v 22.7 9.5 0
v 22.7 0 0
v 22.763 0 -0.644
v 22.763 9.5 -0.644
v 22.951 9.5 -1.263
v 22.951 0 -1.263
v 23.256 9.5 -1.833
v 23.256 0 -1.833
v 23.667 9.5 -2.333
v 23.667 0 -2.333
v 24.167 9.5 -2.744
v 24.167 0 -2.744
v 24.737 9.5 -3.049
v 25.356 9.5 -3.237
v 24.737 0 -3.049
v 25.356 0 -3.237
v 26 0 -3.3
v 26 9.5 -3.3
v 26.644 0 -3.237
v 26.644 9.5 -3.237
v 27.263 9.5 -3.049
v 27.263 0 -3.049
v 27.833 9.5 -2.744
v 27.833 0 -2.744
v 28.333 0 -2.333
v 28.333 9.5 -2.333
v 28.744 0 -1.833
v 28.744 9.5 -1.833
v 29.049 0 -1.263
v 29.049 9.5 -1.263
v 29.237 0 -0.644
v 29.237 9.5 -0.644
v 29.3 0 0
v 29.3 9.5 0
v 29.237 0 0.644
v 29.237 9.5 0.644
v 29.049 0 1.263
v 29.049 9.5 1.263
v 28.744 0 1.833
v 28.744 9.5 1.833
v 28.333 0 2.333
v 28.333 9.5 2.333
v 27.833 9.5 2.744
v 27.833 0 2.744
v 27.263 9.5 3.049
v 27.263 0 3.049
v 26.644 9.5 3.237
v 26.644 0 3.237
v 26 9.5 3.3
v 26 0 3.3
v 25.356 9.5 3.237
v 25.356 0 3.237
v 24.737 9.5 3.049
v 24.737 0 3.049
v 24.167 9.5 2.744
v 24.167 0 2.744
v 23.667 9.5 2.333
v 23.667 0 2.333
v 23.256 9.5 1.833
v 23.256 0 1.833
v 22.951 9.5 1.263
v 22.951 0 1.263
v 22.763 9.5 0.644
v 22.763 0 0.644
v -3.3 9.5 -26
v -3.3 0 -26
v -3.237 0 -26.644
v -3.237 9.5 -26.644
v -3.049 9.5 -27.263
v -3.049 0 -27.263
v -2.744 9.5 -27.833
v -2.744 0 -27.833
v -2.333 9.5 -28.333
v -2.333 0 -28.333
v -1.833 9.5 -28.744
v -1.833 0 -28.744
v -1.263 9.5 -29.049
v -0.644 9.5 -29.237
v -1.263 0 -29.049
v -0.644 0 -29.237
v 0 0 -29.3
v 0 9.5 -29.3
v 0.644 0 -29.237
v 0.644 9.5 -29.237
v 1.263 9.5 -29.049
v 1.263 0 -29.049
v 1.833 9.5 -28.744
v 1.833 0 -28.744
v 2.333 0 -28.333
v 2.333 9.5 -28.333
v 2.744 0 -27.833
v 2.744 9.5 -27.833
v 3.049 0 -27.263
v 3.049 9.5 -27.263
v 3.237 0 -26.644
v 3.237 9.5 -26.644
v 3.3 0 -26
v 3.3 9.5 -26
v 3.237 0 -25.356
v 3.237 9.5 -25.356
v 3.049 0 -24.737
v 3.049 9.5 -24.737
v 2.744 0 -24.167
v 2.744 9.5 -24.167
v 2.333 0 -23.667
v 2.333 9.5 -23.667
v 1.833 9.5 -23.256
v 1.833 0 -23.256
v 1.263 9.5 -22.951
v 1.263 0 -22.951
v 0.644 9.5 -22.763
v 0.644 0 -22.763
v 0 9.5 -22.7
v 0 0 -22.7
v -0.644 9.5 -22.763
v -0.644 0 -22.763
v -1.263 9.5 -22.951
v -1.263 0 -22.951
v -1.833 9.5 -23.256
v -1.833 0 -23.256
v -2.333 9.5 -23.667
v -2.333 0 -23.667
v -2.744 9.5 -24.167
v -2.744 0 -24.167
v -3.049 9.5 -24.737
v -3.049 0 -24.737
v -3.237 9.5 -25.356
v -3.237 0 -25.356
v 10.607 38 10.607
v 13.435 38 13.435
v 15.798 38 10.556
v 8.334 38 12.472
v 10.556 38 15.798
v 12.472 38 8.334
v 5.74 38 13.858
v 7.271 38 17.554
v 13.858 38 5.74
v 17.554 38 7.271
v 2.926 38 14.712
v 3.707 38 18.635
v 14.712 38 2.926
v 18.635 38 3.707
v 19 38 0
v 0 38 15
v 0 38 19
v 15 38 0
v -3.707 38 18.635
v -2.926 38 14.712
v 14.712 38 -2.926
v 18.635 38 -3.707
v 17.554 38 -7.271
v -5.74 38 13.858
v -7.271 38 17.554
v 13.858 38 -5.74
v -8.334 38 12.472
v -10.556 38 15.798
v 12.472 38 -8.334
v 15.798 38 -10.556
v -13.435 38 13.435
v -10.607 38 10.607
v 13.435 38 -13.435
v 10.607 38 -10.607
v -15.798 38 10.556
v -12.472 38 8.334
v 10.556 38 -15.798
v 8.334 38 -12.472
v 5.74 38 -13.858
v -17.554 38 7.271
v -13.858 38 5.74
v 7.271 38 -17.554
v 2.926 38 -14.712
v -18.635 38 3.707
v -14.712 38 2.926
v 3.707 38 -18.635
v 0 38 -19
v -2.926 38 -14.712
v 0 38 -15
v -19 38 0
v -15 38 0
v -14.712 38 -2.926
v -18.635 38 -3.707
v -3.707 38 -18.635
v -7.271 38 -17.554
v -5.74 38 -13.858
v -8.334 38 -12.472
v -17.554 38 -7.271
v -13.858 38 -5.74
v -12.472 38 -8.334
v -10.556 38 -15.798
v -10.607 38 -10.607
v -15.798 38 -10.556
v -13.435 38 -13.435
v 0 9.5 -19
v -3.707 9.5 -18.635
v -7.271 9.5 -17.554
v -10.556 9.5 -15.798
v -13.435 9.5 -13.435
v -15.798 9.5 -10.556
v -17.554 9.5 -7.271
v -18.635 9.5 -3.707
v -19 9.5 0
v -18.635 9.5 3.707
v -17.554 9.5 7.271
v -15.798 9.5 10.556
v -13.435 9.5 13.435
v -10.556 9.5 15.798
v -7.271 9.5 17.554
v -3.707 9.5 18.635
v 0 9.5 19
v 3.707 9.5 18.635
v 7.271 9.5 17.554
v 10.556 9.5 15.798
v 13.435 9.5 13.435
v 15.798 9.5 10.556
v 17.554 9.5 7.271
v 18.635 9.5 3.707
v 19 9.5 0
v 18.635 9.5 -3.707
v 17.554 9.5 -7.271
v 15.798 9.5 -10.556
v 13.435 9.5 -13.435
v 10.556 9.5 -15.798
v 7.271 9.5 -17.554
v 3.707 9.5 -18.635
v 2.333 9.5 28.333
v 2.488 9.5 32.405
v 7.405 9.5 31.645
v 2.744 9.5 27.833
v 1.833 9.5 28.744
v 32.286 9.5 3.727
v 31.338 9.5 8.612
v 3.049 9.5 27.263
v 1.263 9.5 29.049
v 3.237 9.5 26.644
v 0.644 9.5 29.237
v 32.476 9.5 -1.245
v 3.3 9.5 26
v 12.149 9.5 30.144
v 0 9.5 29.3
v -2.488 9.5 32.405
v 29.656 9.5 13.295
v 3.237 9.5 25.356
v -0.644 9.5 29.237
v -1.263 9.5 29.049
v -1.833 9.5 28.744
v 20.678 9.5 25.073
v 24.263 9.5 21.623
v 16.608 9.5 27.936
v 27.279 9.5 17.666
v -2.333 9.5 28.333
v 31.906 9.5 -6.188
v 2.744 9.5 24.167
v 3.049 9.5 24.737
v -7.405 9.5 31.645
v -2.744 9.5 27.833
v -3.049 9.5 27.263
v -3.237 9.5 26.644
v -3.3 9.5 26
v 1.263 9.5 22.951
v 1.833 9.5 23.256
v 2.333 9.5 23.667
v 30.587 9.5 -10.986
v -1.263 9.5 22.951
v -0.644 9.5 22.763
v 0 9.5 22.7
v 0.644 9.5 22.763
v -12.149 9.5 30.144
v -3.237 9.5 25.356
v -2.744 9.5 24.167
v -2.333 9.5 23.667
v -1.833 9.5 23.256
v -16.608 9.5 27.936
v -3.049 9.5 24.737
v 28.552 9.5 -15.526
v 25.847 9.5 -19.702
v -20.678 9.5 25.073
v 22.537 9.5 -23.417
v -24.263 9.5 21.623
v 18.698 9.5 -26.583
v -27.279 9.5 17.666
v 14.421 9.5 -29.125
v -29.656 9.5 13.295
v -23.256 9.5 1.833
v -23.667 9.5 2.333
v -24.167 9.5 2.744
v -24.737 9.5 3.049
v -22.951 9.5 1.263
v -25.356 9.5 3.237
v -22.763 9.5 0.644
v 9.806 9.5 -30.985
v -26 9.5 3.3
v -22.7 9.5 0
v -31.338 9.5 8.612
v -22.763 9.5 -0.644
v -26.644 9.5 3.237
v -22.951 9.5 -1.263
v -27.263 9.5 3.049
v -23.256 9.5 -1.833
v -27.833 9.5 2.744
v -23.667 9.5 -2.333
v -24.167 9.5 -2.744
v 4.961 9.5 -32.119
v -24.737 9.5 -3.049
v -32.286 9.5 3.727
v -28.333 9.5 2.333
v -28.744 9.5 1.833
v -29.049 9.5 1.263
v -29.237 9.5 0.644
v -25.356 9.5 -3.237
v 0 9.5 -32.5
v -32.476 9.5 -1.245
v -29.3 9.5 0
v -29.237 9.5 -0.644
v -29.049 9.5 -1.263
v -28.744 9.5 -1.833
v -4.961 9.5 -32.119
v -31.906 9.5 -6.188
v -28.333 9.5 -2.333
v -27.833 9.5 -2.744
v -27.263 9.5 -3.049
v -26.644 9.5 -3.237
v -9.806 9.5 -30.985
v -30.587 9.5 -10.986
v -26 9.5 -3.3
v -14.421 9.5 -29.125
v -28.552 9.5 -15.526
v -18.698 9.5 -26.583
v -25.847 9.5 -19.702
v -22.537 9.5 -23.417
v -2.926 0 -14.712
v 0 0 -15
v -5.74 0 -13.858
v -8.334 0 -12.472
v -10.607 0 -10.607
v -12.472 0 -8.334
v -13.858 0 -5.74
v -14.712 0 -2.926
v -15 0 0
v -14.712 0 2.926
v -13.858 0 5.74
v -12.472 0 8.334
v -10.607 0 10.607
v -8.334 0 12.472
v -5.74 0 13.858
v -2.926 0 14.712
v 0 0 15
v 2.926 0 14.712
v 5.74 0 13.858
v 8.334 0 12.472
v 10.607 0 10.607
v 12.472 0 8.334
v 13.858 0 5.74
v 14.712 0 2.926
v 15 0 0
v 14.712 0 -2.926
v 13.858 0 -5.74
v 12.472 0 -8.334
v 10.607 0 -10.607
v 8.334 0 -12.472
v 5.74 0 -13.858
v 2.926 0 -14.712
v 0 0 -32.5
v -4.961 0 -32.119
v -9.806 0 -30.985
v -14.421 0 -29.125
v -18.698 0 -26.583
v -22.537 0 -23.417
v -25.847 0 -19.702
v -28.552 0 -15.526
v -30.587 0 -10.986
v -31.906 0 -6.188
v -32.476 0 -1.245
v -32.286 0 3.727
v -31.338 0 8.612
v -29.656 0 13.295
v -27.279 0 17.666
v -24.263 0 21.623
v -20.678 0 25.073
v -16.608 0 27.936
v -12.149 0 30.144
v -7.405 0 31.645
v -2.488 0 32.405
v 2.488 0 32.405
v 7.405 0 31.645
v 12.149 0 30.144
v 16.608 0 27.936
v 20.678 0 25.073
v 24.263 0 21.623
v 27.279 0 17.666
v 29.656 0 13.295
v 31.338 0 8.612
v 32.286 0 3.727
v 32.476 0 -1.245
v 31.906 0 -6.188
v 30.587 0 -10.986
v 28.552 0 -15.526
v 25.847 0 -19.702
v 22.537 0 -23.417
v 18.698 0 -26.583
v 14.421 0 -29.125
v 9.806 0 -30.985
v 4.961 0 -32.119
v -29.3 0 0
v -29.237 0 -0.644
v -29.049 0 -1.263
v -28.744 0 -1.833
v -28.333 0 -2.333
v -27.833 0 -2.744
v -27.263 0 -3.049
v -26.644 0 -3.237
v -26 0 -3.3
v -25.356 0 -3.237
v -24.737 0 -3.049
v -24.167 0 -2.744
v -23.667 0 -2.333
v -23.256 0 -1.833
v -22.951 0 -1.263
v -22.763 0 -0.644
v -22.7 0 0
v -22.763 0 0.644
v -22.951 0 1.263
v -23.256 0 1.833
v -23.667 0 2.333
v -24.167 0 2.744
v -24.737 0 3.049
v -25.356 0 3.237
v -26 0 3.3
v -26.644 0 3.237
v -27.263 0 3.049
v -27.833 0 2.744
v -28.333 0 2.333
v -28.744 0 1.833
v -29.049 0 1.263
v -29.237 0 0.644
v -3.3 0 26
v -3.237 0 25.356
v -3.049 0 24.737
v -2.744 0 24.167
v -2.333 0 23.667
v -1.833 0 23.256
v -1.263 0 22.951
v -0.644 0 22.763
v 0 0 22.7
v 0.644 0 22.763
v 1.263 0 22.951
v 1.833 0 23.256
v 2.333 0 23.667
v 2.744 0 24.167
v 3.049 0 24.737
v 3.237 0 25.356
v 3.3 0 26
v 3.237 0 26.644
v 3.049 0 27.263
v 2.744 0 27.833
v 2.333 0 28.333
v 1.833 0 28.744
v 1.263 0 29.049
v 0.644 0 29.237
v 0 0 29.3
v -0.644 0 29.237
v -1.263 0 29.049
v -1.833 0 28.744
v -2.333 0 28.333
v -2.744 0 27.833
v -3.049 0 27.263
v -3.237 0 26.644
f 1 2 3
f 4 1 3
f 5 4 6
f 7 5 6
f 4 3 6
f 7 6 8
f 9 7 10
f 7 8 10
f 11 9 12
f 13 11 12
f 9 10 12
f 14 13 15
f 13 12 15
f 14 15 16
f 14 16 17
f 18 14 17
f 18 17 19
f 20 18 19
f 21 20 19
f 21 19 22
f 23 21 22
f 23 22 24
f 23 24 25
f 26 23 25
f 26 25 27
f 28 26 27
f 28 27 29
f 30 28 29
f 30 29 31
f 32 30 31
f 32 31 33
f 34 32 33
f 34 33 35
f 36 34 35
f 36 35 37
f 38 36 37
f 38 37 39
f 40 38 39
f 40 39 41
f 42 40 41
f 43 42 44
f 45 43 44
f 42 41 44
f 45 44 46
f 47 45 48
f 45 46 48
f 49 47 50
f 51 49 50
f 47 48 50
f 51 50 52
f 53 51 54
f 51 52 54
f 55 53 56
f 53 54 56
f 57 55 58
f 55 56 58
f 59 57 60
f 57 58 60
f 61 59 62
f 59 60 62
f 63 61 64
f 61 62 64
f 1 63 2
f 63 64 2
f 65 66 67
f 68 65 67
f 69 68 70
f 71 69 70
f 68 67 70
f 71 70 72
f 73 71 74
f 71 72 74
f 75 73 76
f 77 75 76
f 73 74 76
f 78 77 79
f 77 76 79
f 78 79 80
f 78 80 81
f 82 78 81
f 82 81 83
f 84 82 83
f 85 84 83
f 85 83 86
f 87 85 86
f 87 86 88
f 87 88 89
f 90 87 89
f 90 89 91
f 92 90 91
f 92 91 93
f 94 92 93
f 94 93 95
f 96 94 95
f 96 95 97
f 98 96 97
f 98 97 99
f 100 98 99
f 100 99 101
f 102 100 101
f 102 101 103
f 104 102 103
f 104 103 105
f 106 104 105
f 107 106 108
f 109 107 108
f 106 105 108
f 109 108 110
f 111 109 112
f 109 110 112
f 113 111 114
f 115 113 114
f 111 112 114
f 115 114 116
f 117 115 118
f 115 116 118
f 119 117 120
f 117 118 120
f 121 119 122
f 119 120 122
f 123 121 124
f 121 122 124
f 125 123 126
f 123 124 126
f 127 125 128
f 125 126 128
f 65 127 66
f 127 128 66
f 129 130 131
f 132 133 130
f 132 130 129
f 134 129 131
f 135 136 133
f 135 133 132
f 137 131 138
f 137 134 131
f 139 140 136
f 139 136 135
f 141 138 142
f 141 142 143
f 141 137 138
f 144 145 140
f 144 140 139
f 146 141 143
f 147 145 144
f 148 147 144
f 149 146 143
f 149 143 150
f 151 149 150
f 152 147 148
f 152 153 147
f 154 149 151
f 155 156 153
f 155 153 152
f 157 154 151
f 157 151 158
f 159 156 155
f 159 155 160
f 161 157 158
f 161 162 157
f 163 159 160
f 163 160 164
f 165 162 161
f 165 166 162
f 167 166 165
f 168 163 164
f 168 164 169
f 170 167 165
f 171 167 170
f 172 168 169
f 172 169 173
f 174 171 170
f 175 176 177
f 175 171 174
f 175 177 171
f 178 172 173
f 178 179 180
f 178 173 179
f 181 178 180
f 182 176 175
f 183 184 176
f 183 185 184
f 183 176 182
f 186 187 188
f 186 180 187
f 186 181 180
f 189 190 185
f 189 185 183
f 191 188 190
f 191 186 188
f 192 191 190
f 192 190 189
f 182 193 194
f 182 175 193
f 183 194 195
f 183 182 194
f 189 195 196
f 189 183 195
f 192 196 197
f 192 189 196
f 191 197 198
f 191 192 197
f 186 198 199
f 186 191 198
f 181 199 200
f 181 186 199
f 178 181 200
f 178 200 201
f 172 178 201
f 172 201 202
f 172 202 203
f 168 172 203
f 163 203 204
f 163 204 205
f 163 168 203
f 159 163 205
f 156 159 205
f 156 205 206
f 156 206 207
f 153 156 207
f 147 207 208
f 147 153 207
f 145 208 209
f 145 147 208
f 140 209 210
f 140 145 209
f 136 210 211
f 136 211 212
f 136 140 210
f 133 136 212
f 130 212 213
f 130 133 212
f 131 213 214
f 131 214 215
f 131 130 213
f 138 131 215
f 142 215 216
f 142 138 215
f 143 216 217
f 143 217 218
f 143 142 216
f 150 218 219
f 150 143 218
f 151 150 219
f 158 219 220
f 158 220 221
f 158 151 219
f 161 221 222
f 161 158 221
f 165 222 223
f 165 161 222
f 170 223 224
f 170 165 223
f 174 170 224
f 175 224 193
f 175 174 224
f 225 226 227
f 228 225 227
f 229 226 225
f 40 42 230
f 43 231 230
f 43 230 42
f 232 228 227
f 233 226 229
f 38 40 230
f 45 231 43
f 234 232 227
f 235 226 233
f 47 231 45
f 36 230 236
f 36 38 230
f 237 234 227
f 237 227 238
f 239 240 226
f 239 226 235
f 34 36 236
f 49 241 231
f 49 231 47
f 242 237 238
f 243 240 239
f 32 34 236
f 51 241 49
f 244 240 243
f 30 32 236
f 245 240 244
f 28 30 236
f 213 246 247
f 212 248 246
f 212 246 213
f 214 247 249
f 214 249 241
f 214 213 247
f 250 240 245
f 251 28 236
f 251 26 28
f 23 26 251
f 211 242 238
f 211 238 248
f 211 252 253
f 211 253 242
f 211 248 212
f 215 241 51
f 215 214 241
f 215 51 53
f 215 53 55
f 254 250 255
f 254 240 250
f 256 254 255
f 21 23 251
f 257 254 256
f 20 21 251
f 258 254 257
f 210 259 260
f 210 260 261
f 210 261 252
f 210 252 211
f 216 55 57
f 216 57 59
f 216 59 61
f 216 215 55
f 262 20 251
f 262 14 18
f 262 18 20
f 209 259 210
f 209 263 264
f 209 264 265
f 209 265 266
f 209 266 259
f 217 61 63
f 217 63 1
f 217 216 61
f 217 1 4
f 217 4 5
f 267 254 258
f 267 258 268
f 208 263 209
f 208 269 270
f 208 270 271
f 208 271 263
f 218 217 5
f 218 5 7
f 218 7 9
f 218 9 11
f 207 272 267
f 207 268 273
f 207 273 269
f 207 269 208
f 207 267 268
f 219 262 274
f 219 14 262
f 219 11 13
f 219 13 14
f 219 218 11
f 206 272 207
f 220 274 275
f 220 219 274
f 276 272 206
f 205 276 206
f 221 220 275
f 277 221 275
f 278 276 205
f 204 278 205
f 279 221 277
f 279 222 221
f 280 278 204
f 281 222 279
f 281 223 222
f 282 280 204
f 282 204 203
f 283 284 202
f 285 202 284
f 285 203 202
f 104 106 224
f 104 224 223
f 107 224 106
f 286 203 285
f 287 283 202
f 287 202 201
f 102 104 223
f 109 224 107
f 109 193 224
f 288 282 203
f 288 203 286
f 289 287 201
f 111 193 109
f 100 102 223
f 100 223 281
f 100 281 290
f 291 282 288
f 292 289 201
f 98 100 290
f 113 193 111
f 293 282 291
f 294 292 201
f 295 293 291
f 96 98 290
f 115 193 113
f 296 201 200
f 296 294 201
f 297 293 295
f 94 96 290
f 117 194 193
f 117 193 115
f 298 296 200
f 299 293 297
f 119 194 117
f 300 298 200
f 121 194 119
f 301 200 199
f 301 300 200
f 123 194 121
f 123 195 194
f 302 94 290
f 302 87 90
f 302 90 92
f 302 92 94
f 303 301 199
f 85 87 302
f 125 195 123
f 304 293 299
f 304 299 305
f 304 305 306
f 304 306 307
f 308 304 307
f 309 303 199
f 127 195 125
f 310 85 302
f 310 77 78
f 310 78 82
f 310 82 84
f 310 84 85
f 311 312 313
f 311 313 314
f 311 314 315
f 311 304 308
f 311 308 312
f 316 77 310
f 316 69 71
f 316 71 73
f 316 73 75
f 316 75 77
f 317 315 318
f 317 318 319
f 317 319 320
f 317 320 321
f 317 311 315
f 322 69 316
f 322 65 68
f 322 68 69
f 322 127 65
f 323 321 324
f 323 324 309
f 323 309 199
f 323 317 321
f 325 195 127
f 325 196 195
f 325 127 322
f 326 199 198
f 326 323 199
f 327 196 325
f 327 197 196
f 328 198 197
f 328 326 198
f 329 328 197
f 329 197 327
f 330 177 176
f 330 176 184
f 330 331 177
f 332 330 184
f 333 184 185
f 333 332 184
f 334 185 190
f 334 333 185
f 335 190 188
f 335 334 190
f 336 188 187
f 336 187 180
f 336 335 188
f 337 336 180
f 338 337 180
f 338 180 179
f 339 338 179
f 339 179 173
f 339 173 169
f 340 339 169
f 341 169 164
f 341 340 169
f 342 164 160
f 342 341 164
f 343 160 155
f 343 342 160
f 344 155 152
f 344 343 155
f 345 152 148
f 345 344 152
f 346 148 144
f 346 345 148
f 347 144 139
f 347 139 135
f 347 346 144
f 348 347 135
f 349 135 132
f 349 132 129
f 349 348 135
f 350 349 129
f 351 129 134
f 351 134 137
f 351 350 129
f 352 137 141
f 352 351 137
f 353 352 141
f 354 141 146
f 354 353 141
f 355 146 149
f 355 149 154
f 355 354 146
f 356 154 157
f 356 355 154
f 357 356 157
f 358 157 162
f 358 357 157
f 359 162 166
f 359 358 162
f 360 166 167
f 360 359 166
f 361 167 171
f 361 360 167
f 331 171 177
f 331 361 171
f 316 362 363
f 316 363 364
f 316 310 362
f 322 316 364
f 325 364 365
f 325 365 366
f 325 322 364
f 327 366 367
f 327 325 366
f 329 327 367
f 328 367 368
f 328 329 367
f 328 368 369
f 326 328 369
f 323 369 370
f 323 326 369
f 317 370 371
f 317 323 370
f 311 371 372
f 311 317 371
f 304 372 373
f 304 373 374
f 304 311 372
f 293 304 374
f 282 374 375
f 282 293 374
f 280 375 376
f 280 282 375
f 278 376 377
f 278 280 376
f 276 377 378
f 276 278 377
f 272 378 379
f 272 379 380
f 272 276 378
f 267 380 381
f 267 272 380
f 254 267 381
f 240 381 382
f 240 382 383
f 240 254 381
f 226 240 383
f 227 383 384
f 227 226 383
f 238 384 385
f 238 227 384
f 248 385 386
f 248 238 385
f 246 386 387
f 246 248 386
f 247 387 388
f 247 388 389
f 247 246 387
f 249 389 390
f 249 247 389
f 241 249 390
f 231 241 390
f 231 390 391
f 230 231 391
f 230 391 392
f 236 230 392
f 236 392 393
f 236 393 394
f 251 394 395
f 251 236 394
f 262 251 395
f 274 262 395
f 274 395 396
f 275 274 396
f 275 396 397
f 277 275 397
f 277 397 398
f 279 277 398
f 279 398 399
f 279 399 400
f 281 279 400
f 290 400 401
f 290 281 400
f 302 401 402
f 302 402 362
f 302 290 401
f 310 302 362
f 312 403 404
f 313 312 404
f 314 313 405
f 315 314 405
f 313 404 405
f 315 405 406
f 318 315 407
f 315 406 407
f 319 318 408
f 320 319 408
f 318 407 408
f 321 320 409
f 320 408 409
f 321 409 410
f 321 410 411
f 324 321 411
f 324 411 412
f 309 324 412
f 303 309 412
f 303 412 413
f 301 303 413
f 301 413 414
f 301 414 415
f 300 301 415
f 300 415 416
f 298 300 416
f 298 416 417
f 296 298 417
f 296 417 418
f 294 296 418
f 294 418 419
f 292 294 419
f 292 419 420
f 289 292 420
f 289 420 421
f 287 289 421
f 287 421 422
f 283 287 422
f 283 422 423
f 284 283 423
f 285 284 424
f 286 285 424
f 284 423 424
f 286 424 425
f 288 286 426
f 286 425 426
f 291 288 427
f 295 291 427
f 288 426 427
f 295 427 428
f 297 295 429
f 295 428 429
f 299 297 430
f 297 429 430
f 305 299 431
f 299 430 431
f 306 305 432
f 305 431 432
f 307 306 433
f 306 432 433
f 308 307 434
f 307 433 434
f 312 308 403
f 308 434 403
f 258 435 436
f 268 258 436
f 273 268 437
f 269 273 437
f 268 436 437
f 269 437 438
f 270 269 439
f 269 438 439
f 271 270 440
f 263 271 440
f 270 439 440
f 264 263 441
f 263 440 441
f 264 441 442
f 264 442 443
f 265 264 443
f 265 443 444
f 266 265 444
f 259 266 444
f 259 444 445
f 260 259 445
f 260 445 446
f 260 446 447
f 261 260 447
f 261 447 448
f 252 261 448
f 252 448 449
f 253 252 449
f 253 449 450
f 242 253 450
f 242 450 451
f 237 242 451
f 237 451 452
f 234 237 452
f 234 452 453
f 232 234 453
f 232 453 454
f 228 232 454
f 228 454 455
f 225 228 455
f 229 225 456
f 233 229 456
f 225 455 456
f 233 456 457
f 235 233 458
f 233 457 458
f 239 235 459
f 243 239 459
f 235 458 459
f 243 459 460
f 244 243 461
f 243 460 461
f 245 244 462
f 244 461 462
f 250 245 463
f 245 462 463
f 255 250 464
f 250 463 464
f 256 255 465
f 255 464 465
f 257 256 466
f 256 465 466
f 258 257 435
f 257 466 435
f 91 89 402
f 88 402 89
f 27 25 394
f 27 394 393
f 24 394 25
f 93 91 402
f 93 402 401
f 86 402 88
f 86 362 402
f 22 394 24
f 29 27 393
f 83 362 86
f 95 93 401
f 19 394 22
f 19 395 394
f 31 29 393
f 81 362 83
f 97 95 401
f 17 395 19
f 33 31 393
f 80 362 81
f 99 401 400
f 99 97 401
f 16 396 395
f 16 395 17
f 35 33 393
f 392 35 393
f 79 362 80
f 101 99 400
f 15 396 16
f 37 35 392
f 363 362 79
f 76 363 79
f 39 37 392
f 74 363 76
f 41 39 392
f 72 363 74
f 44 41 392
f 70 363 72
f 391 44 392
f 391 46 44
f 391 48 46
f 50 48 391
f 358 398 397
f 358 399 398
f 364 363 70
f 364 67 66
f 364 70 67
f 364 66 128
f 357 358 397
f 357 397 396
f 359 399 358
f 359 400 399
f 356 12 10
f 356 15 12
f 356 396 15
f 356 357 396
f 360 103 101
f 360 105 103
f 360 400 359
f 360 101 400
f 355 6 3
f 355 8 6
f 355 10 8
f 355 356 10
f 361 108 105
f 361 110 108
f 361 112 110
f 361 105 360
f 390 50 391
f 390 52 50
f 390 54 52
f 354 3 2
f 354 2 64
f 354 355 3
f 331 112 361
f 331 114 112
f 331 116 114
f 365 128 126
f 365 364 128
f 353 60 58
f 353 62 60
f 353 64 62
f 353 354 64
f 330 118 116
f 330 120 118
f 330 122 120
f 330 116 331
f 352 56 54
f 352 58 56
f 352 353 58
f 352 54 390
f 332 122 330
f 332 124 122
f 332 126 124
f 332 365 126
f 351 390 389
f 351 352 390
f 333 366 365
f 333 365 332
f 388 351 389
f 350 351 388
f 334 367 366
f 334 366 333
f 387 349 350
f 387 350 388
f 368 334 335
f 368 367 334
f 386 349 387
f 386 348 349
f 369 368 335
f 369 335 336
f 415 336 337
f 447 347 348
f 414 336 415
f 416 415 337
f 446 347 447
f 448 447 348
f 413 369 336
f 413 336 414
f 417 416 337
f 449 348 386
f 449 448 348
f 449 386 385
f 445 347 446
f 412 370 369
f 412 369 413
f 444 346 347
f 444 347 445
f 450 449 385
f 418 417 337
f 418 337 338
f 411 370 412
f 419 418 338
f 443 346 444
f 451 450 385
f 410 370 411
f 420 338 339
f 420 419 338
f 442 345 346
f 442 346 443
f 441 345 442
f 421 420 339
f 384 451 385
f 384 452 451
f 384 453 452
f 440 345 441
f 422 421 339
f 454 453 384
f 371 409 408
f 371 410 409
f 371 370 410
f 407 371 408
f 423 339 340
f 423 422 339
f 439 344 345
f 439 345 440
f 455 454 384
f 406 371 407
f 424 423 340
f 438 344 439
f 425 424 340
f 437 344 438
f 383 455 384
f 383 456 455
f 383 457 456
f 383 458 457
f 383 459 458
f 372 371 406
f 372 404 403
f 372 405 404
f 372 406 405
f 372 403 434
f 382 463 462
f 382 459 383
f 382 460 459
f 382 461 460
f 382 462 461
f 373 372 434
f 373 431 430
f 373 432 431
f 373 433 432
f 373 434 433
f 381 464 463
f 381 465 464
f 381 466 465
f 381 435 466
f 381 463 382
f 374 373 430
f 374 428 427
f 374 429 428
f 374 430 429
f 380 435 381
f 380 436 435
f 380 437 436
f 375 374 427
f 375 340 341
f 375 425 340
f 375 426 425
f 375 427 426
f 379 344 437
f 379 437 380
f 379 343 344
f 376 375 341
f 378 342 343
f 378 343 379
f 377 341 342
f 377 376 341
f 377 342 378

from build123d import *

# Parameters (mm, degrees)
F_6_6_6_6_DIAMETER_HOLE1_D = 6.6


with BuildPart() as part:
    # Sketch1 → Revolve1 (revolve)
    with BuildSketch(Plane.XY):
        Polygon((15, 38), (15, 0), (32.5, 0), (32.5, 9.5), (19, 9.5), (19, 38), align=None)
    revolve(axis=Axis((0, 0, 0), (0, 1, 0)))

    # Ø6.6 (6.6) Diameter Hole1 (through all)
    with Locations(Plane(origin=(0, 9.5, 0), x_dir=(1, 0, 0), z_dir=(0, 1, 0))):
        with Locations((0, 26), (0, -26), (26, 0), (-26, 0)):
            Hole(F_6_6_6_6_DIAMETER_HOLE1_D / 2)


solid = part.part
